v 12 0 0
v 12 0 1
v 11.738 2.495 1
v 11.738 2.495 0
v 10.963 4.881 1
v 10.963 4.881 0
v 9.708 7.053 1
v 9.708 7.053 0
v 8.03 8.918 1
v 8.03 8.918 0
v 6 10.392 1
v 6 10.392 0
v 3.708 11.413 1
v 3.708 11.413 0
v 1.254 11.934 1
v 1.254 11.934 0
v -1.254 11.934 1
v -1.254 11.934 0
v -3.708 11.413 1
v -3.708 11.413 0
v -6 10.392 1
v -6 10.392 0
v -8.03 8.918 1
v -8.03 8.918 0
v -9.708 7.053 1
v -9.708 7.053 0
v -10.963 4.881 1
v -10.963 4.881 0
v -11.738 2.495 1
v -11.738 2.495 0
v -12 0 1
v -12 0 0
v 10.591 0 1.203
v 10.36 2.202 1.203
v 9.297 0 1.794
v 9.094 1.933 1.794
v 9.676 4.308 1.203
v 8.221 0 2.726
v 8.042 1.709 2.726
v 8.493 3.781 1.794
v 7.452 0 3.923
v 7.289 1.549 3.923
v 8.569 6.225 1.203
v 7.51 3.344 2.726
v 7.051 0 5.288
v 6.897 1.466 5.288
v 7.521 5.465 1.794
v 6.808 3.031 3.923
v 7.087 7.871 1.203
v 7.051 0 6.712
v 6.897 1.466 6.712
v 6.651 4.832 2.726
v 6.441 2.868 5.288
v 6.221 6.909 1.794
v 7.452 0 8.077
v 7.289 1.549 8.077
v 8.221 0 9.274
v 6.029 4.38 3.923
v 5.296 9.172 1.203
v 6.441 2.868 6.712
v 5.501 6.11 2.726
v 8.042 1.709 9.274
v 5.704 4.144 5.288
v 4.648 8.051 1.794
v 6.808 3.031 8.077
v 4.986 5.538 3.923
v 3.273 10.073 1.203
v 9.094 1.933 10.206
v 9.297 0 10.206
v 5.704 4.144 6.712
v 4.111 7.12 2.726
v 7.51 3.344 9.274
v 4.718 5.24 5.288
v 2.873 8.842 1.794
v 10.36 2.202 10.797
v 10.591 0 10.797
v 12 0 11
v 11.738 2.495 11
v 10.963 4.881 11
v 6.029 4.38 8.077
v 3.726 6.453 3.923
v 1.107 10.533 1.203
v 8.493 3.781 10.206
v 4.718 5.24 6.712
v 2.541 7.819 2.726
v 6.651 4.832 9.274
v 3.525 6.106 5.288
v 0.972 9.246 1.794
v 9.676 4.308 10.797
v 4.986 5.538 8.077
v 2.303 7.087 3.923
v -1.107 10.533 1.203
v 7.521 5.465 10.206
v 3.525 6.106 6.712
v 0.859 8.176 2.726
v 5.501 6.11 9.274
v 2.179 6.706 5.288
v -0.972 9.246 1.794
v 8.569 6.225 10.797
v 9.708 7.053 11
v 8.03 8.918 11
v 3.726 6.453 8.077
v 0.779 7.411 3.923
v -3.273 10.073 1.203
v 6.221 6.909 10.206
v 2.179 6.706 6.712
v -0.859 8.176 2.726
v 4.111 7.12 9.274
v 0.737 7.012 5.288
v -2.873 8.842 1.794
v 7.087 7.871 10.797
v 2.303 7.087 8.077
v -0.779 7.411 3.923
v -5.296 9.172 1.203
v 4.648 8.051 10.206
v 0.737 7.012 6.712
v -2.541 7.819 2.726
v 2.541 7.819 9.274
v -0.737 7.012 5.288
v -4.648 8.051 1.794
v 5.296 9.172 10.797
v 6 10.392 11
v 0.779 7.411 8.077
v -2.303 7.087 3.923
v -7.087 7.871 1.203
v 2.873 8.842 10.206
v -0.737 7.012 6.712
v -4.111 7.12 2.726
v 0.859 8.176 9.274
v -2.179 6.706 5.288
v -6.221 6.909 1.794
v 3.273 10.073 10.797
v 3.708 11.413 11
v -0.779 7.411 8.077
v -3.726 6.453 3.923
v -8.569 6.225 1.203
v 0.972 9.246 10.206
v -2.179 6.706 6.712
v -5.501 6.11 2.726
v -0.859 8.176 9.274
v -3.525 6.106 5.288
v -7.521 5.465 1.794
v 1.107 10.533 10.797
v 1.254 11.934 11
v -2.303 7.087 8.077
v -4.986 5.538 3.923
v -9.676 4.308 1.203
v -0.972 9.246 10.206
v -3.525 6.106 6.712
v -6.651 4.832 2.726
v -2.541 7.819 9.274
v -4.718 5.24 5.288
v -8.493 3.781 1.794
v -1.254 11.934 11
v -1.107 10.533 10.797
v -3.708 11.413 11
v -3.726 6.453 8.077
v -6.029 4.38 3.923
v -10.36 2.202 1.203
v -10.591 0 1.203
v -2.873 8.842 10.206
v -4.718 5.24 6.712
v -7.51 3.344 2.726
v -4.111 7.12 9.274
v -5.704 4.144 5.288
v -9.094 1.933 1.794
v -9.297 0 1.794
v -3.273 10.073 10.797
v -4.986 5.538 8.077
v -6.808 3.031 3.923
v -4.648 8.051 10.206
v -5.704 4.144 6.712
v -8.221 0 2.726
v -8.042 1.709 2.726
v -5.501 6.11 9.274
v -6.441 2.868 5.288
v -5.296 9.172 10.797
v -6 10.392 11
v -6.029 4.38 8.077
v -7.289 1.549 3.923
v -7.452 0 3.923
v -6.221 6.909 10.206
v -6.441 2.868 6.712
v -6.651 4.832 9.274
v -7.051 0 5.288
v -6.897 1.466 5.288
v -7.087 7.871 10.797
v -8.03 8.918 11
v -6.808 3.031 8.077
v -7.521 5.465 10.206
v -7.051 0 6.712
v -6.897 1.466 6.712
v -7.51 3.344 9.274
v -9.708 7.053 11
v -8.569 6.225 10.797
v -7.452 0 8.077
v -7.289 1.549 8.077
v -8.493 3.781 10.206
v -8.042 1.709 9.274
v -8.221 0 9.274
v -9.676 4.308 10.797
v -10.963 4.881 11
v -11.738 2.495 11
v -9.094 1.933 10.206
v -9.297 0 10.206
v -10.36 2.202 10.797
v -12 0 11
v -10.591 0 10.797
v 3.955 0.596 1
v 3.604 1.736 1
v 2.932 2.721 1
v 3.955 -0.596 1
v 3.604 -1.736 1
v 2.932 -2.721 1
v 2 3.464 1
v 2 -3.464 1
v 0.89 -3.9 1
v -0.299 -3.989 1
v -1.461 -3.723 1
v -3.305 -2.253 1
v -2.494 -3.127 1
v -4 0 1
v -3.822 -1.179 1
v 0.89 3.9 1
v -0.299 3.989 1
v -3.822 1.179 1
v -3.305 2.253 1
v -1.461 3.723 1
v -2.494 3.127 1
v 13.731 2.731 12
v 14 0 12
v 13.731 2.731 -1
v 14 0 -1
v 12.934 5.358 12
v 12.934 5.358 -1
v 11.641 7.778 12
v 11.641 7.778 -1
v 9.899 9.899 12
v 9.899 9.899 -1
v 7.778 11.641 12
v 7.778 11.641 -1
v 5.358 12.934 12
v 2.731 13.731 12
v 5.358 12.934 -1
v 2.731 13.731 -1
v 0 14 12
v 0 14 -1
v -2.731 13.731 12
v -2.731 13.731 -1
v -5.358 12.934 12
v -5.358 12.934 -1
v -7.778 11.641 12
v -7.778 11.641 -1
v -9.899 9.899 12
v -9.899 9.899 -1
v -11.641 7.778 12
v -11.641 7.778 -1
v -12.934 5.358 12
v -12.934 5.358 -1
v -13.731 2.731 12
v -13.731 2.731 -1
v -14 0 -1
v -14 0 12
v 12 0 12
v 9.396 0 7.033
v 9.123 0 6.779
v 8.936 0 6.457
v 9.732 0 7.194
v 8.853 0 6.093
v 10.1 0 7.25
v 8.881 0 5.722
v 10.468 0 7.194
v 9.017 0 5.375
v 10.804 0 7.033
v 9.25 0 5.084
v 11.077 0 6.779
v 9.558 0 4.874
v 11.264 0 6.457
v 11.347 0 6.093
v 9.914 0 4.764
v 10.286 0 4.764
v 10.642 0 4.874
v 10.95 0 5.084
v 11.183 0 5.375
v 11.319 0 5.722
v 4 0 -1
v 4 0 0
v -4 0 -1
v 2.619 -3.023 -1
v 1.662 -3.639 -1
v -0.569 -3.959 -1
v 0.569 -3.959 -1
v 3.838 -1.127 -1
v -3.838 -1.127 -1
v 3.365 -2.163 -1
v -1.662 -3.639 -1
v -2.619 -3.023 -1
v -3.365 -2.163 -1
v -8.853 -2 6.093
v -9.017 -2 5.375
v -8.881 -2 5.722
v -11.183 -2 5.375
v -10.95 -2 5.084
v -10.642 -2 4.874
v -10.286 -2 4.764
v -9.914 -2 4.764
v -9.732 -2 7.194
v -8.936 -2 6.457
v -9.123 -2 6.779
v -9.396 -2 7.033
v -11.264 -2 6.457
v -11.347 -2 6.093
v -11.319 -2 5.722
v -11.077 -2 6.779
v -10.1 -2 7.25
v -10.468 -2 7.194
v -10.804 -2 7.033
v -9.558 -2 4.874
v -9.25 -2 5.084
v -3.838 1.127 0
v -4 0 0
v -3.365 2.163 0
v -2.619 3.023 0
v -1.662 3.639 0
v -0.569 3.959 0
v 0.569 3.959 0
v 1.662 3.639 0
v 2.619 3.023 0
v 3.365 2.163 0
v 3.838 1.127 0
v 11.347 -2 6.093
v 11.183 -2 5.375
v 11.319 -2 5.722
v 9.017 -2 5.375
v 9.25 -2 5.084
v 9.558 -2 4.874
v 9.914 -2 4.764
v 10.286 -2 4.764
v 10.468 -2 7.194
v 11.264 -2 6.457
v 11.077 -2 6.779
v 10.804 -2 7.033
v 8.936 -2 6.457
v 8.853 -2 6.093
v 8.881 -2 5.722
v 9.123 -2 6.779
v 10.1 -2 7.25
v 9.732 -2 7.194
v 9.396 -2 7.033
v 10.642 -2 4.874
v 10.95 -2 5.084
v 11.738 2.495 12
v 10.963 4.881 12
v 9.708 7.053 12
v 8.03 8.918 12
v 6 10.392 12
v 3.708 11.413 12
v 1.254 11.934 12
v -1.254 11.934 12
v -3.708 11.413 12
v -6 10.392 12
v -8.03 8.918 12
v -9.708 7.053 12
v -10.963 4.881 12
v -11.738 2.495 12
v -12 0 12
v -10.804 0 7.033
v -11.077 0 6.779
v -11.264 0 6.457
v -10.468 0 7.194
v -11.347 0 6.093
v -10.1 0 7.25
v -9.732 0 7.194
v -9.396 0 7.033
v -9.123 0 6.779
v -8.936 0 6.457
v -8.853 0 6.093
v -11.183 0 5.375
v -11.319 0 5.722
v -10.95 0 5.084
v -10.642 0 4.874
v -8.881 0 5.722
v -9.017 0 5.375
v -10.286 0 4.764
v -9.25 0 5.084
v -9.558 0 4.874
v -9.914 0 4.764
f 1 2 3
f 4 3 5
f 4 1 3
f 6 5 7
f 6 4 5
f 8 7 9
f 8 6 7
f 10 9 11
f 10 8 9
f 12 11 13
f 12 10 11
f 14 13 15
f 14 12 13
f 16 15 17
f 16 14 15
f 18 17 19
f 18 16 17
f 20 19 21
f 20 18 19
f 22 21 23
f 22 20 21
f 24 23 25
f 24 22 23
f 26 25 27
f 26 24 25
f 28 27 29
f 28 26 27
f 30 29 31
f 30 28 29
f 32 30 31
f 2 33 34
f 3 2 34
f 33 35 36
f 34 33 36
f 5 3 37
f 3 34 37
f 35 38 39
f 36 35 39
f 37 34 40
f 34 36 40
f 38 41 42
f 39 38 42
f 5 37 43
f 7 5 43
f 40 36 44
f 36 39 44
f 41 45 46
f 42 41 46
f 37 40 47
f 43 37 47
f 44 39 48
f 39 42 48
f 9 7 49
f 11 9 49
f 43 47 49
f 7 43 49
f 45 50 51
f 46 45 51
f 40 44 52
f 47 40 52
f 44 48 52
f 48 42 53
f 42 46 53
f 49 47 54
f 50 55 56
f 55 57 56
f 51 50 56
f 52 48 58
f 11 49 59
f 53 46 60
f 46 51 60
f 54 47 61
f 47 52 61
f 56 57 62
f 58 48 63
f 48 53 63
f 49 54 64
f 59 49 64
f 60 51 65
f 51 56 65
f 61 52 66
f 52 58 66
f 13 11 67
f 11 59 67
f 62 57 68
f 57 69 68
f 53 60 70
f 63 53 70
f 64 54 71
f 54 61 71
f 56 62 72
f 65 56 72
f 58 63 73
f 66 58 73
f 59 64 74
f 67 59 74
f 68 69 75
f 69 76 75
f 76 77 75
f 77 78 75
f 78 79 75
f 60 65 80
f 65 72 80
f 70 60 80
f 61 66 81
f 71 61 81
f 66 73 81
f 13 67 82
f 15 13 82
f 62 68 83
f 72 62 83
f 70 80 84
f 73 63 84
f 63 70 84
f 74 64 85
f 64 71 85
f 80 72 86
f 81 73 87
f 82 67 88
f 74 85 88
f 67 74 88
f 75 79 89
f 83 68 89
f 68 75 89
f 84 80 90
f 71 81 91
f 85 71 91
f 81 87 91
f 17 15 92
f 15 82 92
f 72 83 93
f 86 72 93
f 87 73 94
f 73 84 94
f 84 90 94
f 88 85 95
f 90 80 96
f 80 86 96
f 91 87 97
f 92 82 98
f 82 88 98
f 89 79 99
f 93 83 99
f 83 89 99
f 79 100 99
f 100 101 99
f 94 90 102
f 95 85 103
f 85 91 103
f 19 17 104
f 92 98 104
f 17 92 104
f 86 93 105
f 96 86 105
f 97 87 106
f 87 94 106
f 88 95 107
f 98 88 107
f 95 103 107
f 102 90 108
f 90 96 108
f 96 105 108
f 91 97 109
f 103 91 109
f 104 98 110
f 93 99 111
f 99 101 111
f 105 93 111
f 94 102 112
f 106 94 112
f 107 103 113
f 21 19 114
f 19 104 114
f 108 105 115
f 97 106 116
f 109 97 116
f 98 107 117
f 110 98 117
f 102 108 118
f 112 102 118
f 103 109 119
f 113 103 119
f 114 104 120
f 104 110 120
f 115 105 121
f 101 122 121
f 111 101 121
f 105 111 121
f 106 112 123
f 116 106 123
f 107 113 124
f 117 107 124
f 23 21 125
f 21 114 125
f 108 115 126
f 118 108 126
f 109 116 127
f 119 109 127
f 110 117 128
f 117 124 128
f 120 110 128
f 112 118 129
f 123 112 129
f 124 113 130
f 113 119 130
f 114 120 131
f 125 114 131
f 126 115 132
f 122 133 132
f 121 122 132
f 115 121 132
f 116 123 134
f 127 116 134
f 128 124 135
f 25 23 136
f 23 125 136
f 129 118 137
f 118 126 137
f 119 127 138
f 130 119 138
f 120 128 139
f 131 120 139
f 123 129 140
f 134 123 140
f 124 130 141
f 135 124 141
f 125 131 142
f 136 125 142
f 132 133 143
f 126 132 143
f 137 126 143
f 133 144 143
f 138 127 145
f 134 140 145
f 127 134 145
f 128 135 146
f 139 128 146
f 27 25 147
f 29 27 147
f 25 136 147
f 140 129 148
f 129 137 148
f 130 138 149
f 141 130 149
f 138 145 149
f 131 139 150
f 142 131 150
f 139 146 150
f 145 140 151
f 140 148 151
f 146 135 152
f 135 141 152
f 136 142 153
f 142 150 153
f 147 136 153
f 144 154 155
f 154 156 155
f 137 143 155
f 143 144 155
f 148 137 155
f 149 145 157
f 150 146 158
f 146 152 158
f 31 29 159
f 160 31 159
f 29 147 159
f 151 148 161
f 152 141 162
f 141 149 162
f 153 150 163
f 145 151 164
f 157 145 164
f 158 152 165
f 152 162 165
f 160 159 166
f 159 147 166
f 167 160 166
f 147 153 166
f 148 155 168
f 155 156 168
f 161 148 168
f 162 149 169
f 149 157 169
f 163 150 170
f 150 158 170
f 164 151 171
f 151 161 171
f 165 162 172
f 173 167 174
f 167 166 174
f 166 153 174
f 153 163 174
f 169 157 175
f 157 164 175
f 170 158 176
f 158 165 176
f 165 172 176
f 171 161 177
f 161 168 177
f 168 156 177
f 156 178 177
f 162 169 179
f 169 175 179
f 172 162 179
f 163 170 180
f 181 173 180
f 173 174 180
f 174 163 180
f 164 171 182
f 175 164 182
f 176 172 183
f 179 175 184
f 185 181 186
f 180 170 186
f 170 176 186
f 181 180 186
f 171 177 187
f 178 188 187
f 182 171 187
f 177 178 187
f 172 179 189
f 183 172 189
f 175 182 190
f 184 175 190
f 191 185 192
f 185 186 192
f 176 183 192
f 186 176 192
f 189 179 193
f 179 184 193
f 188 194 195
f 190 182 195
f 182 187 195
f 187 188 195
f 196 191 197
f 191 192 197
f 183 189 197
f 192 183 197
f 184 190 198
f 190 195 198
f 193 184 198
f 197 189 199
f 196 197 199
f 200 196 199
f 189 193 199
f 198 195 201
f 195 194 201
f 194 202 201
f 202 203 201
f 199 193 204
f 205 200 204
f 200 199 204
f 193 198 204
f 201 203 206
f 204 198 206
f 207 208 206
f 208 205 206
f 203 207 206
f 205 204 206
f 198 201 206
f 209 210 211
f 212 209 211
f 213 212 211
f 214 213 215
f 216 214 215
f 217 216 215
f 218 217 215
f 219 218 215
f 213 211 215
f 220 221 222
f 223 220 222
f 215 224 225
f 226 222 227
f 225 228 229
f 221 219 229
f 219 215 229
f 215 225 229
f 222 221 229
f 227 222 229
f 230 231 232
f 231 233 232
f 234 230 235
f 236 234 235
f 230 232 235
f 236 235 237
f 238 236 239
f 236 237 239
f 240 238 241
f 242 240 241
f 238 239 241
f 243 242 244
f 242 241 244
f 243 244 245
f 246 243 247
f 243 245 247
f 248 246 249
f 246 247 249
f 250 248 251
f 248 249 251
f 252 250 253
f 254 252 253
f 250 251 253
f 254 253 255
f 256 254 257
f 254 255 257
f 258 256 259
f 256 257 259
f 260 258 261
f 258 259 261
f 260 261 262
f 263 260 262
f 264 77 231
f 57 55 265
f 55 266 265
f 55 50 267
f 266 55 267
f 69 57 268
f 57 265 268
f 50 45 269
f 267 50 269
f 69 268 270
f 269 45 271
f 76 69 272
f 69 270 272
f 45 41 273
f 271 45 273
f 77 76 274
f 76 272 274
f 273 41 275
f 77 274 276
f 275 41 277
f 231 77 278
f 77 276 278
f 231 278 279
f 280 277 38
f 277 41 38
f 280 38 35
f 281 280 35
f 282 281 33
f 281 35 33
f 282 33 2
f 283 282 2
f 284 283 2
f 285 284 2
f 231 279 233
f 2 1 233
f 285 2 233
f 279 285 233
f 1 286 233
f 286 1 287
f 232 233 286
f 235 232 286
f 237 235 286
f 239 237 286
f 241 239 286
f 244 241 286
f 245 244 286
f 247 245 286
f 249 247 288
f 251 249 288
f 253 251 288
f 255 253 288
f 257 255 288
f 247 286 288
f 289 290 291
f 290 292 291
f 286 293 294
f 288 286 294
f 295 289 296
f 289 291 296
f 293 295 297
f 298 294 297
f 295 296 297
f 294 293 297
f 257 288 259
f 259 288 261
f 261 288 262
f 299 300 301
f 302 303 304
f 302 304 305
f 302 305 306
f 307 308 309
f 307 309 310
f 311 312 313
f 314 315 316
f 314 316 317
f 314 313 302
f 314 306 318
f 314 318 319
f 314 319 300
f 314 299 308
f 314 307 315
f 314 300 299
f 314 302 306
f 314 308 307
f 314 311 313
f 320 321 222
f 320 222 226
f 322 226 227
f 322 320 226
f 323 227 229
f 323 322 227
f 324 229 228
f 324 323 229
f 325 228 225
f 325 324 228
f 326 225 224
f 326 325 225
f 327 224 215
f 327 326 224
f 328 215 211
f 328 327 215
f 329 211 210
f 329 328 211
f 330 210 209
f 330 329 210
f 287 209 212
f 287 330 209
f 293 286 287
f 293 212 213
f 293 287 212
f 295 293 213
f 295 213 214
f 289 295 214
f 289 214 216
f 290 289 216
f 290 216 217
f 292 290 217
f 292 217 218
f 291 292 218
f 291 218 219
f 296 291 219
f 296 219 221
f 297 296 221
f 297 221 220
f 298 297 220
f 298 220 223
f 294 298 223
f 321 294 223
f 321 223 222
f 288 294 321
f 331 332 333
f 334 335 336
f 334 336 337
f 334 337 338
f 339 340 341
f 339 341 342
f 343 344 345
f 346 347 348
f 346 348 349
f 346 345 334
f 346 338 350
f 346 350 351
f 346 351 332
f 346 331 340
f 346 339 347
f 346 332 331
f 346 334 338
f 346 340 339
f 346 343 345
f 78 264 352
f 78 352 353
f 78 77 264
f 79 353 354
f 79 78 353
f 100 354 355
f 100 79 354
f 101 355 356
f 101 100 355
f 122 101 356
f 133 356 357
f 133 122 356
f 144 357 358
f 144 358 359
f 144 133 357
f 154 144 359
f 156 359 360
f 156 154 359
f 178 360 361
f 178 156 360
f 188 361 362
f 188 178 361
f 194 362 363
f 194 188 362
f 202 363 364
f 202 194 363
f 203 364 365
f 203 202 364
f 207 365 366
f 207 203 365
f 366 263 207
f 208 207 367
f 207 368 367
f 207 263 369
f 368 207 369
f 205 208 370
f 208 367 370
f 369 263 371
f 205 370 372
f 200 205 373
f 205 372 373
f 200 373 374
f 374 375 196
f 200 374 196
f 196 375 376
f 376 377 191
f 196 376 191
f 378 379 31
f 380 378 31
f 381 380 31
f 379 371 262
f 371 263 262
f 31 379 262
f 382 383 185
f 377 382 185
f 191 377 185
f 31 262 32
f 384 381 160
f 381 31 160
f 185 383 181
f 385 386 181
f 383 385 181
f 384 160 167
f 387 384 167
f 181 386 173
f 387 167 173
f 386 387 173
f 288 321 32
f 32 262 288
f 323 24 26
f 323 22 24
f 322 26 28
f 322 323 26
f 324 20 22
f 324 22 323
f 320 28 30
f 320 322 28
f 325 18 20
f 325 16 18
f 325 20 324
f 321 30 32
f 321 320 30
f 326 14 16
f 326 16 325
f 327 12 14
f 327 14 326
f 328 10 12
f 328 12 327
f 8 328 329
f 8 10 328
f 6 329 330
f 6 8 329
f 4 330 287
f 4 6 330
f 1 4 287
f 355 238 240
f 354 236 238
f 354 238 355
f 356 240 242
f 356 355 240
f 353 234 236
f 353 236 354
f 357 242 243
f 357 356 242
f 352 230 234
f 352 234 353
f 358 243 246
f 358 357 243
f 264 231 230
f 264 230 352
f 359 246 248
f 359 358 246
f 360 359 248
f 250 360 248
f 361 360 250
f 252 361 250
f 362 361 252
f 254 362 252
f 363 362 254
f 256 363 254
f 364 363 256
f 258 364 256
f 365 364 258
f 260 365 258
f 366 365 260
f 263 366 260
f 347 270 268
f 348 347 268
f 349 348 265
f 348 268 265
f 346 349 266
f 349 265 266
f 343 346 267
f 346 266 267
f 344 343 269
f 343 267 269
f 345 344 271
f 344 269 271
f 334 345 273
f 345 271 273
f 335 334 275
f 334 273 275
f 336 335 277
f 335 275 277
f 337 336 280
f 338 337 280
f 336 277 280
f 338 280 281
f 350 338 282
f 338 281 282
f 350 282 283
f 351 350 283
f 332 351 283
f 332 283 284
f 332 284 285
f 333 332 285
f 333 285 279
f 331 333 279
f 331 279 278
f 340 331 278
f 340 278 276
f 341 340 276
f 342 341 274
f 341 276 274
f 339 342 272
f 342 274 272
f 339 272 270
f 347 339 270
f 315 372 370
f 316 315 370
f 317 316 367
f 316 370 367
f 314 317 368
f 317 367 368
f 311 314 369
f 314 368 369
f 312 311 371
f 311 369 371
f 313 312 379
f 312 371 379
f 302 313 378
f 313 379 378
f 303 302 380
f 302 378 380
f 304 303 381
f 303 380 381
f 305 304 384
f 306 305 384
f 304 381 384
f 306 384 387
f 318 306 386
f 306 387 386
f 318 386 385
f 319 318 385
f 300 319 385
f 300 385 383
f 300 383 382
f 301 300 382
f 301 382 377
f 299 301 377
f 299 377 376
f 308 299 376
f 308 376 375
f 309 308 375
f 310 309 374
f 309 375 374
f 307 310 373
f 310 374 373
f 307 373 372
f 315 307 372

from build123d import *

# Parameters (mm, degrees)
SKETCH_1_R              = 12
EXTRUDE_1_DEPTH         = 12
DELETE_BODY_1_OUTLINE_R = 5
DELETE_BODY_1_DEPTH     = 12
EXTRUDE_START           = -1
SKETCH_2_R              = 12
EXTRUDE_2_DEPTH         = 1
SKETCH_3_W              = 2
SKETCH_3_H              = 13
SKETCH_5_W              = 34.262916627
SKETCH_5_H              = 20.154656839
CUT_EXTRUDE_3_DEPTH     = 24.151673806
SKETCH_6_R              = 1.25
EXTRUDE_4_DEPTH         = 2
SKETCH_7_R              = 4
EXTRUDE_5_DEPTH         = 2


# Read off the part's stored shape, not the designer's step: 型腔1, 实体-删除/保留 1
with BuildPart() as part:
    # 草图1 → 凸台-拉伸1 (new body)
    with BuildSketch(Plane.XY):
        Circle(SKETCH_1_R)
    extrude(amount=EXTRUDE_1_DEPTH)

    # 型腔1 outline → 型腔1 (revolve, cut)
    with BuildSketch(Plane.XZ):
        with BuildLine():
            Line((12, 12), (4, 12))
            Line((4, 12), (4, 8))
            Line((4, 8), (5, 8))
            Line((5, 8), (5, 4))
            Line((5, 4), (4, 4))
            Line((4, 4), (4, 0))
            Line((4, 0), (12, 0))
            Line((12, 0), (12, 1))
            ThreePointArc((12, 1), (7, 6), (12, 11))
            Line((12, 11), (12, 12))
        make_face()
    revolve(axis=Axis((0, 0, 0), (0, 0, 1)), mode=Mode.SUBTRACT)

    # Delete Body 1 outline → Delete Body 1 (cut)
    with BuildSketch(Plane.XY):
        Circle(DELETE_BODY_1_OUTLINE_R)
    extrude(amount=DELETE_BODY_1_DEPTH, mode=Mode.SUBTRACT)



with BuildPart() as body_2:
    # 草图2 → 凸台-拉伸2 (new body)
    with BuildSketch(Plane.XY.offset(EXTRUDE_START)):
        with Locations(Location((0, 0, 0), (0, 0, 270))):
            Circle(SKETCH_2_R)
    extrude(amount=EXTRUDE_2_DEPTH)


with BuildPart() as part_1:
    add(part.part)

    add(body_2.part)  # 旋转1 merges body 2
    # 草图3 → 旋转1 (revolve)
    with BuildSketch(Plane(origin=(0, 0, 0), x_dir=(1, 0, 0), z_dir=(0, 1, 0))):
        with Locations((-13, -5.5)):
            Rectangle(SKETCH_3_W, SKETCH_3_H)
    revolve(axis=Axis((0, 0, 0), (0, 0, 1)))

    # 草图5 → 切除-拉伸3 (cut, through all)
    with BuildSketch(Plane(origin=(0, 0, 0), x_dir=(1, 0, 0), z_dir=(0, 1, 0))):
        with Locations((0.6382308, -6.140467699)):
            Rectangle(SKETCH_5_W, SKETCH_5_H)
    extrude(amount=-CUT_EXTRUDE_3_DEPTH, mode=Mode.SUBTRACT)

    # 草图6 → 凸台-拉伸4 (add)
    with BuildSketch(Plane.XZ):
        with Locations(Location((-10.1, 6, 0), (0, 0, 90))):
            Circle(SKETCH_6_R)
        with Locations(Location((10.1, 6, 0), (0, 0, 90))):
            Circle(SKETCH_6_R)
    extrude(amount=EXTRUDE_4_DEPTH)

    # 草图7 → 凸台-拉伸5 (add)
    with BuildSketch(Plane(origin=(0, 0, -1), x_dir=(-1, 0, 0), z_dir=(0, 0, -1))):
        Circle(SKETCH_7_R)
    extrude(amount=-EXTRUDE_5_DEPTH)


solid = part_1.part
